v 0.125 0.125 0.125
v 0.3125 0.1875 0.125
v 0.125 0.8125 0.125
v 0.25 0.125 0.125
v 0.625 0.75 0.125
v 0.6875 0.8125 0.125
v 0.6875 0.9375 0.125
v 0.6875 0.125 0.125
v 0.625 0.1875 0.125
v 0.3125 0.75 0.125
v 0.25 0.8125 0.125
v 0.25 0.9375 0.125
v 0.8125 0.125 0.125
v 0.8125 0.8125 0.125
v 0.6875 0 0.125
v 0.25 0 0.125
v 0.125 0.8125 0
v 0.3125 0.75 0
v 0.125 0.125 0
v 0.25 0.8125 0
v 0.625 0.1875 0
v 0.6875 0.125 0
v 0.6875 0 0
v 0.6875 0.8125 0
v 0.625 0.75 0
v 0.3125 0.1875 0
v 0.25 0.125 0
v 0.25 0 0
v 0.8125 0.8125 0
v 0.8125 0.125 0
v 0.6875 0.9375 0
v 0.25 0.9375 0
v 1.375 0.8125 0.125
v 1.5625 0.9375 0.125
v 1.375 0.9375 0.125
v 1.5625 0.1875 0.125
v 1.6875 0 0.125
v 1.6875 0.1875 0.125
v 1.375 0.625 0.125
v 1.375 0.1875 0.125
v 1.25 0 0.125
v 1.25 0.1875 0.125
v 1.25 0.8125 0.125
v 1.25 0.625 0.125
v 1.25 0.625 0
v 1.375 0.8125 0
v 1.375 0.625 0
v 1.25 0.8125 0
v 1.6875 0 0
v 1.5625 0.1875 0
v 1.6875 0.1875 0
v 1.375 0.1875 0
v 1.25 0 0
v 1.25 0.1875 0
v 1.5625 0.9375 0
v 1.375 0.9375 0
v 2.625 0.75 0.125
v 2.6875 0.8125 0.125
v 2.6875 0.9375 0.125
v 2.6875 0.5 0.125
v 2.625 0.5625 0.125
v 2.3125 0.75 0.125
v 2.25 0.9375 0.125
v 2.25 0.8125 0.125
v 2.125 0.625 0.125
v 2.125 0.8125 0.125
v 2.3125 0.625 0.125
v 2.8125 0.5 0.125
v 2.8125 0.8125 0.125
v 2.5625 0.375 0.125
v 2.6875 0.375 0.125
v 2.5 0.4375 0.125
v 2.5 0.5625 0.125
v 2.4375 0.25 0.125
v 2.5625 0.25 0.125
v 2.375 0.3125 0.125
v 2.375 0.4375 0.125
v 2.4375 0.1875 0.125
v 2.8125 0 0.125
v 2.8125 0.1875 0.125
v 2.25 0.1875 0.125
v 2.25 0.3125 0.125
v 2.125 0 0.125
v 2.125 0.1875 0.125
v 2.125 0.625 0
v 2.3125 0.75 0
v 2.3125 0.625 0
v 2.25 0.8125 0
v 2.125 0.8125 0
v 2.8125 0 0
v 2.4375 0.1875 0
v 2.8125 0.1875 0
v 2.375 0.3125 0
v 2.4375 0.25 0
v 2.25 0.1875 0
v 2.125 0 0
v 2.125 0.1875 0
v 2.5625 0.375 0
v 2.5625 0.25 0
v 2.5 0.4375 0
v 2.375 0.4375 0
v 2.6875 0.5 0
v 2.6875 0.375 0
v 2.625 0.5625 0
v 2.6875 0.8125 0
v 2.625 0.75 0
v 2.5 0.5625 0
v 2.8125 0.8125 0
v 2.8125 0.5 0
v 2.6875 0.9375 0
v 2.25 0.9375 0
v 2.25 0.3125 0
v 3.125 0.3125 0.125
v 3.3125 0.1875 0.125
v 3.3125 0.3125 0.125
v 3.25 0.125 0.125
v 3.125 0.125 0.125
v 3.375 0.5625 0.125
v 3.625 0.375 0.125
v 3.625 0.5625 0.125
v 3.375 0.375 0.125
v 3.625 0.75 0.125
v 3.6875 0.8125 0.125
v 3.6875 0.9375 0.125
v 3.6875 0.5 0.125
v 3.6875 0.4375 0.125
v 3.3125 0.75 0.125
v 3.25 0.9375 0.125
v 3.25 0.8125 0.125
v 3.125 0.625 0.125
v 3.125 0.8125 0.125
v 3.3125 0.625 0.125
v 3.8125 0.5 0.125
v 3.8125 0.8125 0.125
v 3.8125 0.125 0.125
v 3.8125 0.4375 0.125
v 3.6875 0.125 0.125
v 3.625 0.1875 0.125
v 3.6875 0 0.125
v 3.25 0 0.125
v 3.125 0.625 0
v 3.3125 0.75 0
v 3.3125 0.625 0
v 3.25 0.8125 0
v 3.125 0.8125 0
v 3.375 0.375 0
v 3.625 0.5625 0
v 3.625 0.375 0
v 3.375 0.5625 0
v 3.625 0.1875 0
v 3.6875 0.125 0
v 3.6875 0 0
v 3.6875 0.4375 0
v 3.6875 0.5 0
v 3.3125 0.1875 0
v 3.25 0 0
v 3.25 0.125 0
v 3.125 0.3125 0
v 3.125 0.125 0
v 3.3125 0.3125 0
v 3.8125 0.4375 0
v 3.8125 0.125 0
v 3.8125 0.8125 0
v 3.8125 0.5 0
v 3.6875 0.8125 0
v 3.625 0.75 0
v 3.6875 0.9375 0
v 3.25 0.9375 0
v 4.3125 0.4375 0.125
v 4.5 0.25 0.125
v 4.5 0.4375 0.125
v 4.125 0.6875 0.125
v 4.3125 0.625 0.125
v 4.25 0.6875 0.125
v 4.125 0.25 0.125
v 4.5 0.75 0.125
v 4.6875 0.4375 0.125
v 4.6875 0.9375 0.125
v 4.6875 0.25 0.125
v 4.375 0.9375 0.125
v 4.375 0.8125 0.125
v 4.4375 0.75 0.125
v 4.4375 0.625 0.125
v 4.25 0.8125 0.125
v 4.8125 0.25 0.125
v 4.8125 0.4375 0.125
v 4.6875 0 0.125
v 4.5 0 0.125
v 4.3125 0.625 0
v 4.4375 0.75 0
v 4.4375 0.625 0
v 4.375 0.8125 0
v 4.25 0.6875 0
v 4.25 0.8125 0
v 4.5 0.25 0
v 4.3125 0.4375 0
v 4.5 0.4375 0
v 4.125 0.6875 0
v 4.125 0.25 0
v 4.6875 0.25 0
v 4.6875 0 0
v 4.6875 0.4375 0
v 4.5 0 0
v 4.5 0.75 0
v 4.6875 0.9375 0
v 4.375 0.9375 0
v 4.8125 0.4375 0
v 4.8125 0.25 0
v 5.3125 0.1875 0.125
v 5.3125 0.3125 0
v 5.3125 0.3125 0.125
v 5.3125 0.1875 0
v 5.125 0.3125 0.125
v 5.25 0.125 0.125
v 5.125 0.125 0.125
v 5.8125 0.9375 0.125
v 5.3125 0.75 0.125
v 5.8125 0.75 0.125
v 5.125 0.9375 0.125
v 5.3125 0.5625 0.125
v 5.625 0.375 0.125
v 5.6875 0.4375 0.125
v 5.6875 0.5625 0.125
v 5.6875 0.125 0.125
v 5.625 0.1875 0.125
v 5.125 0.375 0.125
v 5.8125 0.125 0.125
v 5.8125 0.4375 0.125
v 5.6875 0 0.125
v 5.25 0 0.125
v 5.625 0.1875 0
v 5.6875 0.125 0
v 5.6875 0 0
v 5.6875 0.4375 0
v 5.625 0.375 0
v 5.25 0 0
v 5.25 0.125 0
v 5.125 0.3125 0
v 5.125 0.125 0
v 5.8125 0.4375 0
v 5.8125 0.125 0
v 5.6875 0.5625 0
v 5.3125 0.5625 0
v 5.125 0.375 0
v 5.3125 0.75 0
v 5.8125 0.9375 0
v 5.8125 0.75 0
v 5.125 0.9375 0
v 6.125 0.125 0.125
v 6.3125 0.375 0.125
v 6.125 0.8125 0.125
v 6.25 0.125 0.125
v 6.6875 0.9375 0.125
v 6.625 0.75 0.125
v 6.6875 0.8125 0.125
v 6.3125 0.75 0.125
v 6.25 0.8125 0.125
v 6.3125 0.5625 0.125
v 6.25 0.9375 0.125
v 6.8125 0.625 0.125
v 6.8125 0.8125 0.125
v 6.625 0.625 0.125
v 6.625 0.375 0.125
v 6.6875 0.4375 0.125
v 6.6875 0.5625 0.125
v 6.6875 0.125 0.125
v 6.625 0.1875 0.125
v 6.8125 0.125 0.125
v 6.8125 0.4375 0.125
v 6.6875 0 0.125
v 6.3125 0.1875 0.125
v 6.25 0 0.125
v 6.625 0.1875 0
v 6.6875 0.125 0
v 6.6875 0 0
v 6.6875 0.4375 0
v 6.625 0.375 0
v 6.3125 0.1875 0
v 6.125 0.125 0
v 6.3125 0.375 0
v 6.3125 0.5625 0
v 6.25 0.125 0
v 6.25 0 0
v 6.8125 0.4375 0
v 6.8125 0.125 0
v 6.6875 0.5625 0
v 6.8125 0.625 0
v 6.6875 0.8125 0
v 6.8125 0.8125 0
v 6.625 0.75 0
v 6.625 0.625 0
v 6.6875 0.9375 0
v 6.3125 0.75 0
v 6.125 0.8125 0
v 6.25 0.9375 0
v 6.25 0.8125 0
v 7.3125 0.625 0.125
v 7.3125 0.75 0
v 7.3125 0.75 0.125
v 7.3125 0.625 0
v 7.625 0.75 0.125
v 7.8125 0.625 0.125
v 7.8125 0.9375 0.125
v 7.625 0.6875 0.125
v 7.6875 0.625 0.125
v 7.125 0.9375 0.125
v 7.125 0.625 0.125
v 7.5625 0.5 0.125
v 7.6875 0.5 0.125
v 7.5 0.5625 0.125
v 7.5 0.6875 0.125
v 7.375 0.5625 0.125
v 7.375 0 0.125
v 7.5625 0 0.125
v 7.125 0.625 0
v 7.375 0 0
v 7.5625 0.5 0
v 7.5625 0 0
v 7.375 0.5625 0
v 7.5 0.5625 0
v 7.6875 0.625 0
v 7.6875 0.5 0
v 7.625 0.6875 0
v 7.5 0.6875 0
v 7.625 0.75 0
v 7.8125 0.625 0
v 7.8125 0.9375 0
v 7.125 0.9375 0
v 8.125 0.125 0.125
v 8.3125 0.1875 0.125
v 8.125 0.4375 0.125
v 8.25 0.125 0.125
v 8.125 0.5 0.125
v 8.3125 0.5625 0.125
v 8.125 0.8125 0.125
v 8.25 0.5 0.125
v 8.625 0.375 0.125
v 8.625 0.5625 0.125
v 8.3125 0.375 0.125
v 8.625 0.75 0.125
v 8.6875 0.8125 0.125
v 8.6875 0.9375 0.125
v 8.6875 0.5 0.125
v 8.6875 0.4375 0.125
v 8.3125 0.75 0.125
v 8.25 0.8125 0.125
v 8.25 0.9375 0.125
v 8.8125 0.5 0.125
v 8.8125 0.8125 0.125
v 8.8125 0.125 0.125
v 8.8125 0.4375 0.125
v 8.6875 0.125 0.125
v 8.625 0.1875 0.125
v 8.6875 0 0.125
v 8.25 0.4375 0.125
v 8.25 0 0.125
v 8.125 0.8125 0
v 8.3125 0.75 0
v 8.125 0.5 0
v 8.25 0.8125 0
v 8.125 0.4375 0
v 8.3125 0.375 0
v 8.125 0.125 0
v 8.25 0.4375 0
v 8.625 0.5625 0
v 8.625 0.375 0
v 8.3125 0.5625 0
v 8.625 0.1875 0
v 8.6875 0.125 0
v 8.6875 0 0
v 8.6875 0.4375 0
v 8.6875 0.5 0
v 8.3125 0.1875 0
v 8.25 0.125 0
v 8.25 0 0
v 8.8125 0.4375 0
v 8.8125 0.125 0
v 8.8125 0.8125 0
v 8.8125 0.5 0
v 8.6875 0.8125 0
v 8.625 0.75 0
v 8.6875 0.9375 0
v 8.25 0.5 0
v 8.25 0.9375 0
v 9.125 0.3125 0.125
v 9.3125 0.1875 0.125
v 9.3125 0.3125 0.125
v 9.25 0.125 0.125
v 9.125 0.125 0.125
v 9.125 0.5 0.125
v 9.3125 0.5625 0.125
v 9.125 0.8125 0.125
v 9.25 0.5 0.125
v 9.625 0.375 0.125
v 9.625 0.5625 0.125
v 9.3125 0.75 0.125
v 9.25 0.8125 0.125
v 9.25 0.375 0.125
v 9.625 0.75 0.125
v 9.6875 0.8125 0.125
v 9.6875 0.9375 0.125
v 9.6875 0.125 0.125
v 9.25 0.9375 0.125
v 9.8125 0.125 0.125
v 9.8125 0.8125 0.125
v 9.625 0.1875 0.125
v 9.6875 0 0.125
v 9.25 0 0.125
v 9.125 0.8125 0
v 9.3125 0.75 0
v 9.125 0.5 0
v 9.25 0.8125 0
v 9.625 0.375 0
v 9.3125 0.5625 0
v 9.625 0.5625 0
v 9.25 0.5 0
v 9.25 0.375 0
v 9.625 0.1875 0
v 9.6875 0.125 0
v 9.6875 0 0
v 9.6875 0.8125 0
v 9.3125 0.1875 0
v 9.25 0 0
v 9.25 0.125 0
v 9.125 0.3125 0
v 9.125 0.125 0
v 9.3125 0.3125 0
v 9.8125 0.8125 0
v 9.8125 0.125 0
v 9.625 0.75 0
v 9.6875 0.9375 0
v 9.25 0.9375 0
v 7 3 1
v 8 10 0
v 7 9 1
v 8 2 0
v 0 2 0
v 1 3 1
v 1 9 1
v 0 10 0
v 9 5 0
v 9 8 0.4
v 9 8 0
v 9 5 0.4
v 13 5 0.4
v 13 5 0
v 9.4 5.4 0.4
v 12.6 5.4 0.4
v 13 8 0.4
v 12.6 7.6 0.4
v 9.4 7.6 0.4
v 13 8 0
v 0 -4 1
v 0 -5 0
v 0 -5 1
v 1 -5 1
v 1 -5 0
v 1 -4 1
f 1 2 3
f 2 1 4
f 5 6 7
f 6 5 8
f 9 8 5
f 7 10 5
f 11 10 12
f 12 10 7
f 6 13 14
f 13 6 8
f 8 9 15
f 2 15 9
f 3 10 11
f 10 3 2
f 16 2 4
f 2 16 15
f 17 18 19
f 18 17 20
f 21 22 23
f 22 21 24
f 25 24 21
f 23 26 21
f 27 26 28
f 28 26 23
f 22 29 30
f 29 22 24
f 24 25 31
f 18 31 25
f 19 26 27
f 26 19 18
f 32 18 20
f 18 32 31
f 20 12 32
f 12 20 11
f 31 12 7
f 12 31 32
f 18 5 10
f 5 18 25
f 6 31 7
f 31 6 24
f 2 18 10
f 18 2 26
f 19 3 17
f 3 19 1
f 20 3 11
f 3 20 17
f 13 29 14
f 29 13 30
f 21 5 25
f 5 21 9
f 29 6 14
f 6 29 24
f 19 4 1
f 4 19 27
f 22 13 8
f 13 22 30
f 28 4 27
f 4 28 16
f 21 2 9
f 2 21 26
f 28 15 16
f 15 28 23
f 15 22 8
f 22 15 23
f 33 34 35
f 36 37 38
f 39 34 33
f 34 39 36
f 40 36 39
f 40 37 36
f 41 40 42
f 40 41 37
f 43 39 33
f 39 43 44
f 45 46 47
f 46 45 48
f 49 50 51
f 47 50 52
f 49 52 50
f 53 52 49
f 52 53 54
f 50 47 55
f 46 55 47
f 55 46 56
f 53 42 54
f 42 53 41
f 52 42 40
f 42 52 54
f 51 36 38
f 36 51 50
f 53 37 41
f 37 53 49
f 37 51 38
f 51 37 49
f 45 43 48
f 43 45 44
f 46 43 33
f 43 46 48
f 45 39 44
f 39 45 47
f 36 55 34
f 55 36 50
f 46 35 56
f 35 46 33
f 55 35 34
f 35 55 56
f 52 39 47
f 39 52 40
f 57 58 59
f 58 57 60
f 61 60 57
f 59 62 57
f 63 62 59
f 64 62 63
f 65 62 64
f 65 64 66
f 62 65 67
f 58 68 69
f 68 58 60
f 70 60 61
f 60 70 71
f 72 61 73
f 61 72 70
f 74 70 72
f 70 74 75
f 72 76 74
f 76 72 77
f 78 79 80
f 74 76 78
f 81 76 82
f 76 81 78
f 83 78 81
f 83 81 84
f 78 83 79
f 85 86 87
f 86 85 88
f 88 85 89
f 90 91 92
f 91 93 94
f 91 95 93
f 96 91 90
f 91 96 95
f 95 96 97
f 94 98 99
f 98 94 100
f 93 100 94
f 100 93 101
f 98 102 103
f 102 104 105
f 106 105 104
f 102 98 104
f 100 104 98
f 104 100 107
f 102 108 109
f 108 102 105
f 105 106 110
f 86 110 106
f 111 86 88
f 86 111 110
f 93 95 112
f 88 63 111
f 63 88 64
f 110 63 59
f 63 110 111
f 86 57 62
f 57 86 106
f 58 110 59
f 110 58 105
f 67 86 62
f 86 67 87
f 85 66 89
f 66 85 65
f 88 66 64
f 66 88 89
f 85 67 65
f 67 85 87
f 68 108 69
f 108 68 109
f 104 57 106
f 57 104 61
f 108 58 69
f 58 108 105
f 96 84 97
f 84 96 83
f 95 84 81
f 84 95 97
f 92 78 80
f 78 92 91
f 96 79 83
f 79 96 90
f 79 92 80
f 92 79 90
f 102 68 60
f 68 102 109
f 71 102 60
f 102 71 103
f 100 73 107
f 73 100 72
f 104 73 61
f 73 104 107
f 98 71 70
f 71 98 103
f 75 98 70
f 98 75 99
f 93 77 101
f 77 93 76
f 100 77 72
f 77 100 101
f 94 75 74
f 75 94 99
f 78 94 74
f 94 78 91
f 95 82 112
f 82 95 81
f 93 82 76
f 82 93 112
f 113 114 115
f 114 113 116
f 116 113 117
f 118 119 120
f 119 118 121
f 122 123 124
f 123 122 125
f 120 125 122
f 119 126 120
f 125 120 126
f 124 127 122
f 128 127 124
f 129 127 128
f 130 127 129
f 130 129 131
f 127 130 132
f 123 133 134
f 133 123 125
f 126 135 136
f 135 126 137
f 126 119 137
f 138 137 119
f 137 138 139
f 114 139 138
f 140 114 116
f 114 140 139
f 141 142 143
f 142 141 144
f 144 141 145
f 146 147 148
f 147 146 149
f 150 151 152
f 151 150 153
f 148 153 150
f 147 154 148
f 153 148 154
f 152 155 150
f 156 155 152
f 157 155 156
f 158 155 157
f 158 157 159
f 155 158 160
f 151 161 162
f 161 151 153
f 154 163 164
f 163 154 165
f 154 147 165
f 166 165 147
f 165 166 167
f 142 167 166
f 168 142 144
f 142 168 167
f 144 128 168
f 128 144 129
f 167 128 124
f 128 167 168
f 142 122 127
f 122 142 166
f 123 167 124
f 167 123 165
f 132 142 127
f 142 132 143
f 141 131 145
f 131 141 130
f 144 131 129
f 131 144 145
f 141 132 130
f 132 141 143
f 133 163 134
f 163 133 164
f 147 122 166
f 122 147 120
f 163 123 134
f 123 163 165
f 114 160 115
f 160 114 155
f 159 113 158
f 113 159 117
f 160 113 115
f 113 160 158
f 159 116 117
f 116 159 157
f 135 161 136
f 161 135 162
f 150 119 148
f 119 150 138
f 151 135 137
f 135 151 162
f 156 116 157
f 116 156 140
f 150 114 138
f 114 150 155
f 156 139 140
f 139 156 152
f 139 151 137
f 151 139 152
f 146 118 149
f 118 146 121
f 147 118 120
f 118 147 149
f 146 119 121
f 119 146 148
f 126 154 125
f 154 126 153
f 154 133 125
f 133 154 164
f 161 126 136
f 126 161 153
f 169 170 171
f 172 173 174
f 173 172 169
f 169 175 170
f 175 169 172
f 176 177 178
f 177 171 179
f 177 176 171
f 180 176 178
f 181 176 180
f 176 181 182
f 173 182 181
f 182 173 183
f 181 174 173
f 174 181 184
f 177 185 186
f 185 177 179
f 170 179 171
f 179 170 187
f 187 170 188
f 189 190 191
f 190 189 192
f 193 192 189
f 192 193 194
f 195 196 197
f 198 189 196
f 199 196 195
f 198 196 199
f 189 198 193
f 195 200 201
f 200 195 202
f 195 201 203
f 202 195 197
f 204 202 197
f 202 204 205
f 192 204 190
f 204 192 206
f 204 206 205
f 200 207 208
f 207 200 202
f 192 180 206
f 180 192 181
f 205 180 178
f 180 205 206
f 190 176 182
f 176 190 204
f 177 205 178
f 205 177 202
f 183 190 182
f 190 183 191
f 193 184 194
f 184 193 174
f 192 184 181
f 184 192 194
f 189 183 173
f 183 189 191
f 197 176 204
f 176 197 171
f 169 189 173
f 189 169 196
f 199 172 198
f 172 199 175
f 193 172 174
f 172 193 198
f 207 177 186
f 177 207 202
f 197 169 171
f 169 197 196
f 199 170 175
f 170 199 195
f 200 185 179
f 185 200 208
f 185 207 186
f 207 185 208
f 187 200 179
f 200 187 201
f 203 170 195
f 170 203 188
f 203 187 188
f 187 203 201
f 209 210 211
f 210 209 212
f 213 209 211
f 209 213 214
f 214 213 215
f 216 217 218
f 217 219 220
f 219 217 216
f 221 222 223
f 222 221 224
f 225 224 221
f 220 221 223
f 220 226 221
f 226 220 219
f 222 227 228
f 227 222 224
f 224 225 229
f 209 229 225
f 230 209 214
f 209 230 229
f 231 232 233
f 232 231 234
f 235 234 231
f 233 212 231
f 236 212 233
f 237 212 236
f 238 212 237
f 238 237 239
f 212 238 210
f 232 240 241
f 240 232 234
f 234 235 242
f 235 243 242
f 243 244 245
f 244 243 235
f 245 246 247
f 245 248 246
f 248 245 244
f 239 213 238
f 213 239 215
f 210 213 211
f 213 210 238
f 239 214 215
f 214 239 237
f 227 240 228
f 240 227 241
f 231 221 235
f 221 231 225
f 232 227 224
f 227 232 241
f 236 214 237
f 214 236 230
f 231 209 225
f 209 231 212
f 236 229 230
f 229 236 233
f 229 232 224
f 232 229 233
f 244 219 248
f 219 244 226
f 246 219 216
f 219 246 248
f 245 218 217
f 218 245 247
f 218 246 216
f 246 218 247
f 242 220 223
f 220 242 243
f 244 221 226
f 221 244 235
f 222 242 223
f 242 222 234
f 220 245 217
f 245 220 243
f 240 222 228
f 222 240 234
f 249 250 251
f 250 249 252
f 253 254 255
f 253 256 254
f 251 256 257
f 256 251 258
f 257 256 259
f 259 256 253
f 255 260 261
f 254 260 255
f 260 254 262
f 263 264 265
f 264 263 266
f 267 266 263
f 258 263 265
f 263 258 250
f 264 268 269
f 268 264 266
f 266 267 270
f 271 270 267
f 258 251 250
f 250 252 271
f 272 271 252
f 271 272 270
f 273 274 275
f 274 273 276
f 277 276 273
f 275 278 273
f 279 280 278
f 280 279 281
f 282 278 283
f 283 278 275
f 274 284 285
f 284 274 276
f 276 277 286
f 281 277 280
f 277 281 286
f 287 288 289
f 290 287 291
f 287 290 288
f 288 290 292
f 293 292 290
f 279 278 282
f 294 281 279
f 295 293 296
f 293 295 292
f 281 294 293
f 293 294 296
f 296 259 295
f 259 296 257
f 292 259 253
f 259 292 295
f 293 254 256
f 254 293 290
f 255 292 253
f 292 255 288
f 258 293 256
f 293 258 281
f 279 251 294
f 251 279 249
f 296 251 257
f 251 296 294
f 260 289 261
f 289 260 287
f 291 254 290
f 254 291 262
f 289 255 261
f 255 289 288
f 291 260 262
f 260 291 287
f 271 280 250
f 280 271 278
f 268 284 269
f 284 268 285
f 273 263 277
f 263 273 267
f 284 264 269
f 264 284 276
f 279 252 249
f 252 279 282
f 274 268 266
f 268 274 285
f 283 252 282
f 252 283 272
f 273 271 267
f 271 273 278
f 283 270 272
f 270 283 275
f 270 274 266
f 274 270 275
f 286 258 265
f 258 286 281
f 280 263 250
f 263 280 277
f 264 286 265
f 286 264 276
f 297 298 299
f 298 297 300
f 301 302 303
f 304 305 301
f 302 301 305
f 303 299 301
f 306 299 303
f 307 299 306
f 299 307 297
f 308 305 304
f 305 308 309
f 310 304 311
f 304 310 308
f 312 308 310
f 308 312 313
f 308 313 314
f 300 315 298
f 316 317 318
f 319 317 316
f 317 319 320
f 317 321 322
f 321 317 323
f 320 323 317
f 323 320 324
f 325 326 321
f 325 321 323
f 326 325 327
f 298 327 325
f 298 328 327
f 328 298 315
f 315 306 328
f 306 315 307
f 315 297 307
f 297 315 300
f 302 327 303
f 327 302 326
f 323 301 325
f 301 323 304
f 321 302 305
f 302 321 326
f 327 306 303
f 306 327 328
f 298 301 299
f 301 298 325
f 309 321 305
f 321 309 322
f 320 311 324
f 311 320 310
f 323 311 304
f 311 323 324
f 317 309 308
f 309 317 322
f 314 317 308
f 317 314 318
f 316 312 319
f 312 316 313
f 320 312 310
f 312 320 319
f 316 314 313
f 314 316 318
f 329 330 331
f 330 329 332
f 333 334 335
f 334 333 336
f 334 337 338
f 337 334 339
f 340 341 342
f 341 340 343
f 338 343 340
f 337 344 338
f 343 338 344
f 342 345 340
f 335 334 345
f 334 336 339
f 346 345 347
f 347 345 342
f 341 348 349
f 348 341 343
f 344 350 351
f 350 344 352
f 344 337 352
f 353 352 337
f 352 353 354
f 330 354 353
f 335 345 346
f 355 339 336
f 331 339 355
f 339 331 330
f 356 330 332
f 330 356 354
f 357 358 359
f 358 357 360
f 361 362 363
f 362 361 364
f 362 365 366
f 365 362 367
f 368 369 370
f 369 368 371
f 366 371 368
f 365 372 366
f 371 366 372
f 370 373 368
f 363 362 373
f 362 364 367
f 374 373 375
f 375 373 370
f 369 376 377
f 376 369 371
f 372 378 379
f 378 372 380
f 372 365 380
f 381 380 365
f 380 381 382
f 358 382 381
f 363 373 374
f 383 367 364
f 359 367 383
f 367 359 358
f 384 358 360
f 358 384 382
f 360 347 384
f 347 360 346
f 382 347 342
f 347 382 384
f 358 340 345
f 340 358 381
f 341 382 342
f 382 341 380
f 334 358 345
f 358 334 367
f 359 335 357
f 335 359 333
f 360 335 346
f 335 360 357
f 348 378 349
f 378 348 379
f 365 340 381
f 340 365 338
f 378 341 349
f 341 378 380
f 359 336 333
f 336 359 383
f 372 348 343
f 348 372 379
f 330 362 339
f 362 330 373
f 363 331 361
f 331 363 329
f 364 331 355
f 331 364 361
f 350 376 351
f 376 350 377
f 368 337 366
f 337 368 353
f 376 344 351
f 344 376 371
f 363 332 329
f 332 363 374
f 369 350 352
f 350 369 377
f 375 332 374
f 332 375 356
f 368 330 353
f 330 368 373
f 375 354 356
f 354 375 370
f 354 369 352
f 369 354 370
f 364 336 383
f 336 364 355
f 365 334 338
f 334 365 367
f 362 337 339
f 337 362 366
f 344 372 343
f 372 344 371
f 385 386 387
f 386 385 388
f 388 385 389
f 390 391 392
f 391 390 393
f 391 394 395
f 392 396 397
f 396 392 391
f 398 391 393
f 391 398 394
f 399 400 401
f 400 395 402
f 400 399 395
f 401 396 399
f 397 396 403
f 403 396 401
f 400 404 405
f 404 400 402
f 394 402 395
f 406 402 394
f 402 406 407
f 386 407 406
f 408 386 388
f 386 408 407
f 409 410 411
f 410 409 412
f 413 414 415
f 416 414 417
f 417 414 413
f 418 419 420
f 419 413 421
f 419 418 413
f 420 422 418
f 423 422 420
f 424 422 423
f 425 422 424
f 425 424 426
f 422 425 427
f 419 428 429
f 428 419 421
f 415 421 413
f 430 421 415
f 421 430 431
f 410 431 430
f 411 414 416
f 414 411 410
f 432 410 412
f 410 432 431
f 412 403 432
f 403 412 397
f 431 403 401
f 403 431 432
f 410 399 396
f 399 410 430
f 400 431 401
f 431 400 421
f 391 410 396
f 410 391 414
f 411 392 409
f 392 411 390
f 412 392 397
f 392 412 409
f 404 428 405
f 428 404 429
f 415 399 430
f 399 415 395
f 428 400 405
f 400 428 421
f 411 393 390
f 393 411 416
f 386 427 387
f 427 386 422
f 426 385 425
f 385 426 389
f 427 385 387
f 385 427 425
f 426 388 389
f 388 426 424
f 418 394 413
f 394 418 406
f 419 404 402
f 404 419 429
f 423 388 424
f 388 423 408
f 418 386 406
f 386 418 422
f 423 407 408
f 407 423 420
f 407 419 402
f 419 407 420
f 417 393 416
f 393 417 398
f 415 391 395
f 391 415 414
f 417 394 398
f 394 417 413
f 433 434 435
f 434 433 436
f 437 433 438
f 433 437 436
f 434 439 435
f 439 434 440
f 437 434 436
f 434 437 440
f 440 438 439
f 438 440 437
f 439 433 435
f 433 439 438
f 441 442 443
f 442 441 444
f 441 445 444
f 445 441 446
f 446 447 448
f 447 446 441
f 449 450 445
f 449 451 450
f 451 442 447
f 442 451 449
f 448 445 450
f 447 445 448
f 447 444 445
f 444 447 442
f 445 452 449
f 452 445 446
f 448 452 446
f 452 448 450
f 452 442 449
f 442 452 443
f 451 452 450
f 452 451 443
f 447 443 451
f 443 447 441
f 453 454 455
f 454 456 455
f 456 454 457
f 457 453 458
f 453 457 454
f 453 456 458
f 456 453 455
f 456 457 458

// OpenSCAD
numbers=[ 

 [[0,0,0,0,0,0],
  [0,0,1,1,1,0], 
  [0,1,0,0,0,1], 
  [0,1,0,0,0,1], 
  [0,1,0,0,0,1], 
  [0,1,0,0,0,1], 
  [0,1,0,0,0,1], 
  [0,0,1,1,1,0]],

 [[0,0,0,0,0,0],
  [0,0,0,1,0,0], 
  [0,0,1,1,0,0], 
  [0,0,0,1,0,0], 
  [0,0,0,1,0,0], 
  [0,0,0,1,0,0], 
  [0,0,0,1,0,0], 
  [0,0,1,1,1,0]],

 [[0,0,0,0,0,0],
  [0,0,1,1,1,0], 
  [0,1,0,0,0,1], 
  [0,0,0,0,0,1], 
  [0,0,0,0,1,0], 
  [0,0,0,1,0,0], 
  [0,0,1,0,0,0], 
  [0,1,1,1,1,1]],

 [[0,0,0,0,0,0],
  [0,0,1,1,1,0], 
  [0,1,0,0,0,1], 
  [0,0,0,0,0,1], 
  [0,0,0,1,1,0], 
  [0,0,0,0,0,1], 
  [0,1,0,0,0,1], 
  [0,0,1,1,1,0]],

 [[0,0,0,0,0,0],
  [0,0,0,1,1,0], 
  [0,0,1,0,1,0], 
  [0,1,0,0,1,0], 
  [0,1,0,0,1,0], 
  [0,1,1,1,1,1], 
  [0,0,0,0,1,0], 
  [0,0,0,0,1,0]],

 [[0,0,0,0,0,0],
  [0,1,1,1,1,1], 
  [0,1,0,0,0,0], 
  [0,1,0,0,0,0], 
  [0,1,1,1,1,0], 
  [0,0,0,0,0,1], 
  [0,1,0,0,0,1], 
  [0,0,1,1,1,0]],

 [[0,0,0,0,0,0],
  [0,0,1,1,1,0], 
  [0,1,0,0,0,1], 
  [0,1,0,0,0,], 
  [0,1,1,1,1,0], 
  [0,1,0,0,0,1], 
  [0,1,0,0,0,1], 
  [0,0,1,1,1,0]],

 [[0,0,0,0,0,0],
  [0,1,1,1,1,1], 
  [0,1,0,0,0,1], 
  [0,0,0,0,1,0], 
  [0,0,0,1,0,0], 
  [0,0,0,1,0,0], 
  [0,0,0,1,0,0], 
  [0,0,0,1,0,0]],

 [[0,0,0,0,0,0],
  [0,0,1,1,1,0], 
  [0,1,0,0,0,1], 
  [0,1,0,0,0,1], 
  [0,0,1,1,1,0], 
  [0,1,0,0,0,1], 
  [0,1,0,0,0,1], 
  [0,0,1,1,1,0]],

 [[0,0,0,0,0,0],
  [0,0,1,1,1,0], 
  [0,1,0,0,0,1], 
  [0,1,0,0,0,1], 
  [0,0,1,1,1,1], 
  [0,0,0,0,0,1], 
  [0,1,0,0,0,1], 
  [0,0,1,1,1,0]],
];

module number(value,x,y,z,size,height,fatness){
   translate(v=[x,y,z]){
      scale(v=[0.75*size,size,height]){
         for ( iy = [0:7] ) {
            for (ix = [0:5] ) {
               if (numbers[value][iy][ix]==1)
               translate(v=[ix/6,(7-iy)/8,0])
               cube(size=[fatness/6,fatness/8,1/8]);
            }
         }
      }
   }
}

module flattop4pyramid(x,y,z,a,lx,ly,h1,h2){
   translate(v=[x,y,z]){
      rotate(a=a,v=[0,0,1]){
         difference(){
           scale(v=[lx,ly,h1])
			polyhedron(
			  points=[ [1,1,0],[1,0,0],
                    [0,0,0],[0,1,0], // the four points at base
			           [0.5,0.5,1]  ],         // the apex point 
			  triangles=[ [0,1,4],[1,2,4],
                         [2,3,4],[3,0,4],  // each triangle side
			              [1,0,3],[2,1,3] ] // two triangles for square base
			 );
            translate(v=[-1,-1,h2]){
               cube(size=[lx+2,ly+2,h1],center=false);
            }
         }
      }
   }
}

module supportbeam(x,y,z,a,lx,w){
   translate(v=[x,y,z]){
      rotate(a=a,v=[0,0,1]){
        scale(v=[lx,w,w]){
			polyhedron(
			  points=[ [0,0,0],[0,0,1],[0,1,1],
                      [1,0,0],[1,0,1],[1,1,1]],
			  triangles=[ [0,2,1],[3,4,5],
                         [0,4,3],[0,1,4],
                         [1,5,4],[1,2,5],
                         [0,3,5],[0,5,2] ] 
			 );
        }
      }
   }
}


module rectsupportingridge(x,y,z,a,xl,yl,w){
   translate(v=[x,y,z]){
      rotate(a=a,v=[0,0,1]){
         supportbeam(0,0,0,0,xl,w);
         supportbeam(xl,0,0,90,yl,w);
         supportbeam(xl,yl,0,180,xl,w);
         supportbeam(0,yl,0,270,yl,w);
      }
   }
}


  


f=1.5;
number(0,0,0,0,1,1,f);
number(1,1,0,0,1,1,f);
number(2,2,0,0,1,1,f);
number(3,3,0,0,1,1,f);
number(4,4,0,0,1,1,f);
number(5,5,0,0,1,1,f);
number(6,6,0,0,1,1,f);
number(7,7,0,0,1,1,f);
number(8,8,0,0,1,1,f);
number(9,9,0,0,1,1,f);

flattop4pyramid(0,2,0,0,8,8,4,1);

rectsupportingridge(9,5,0,0,4,3,0.4);

supportbeam(0,-5,0,0,1,1,1);
